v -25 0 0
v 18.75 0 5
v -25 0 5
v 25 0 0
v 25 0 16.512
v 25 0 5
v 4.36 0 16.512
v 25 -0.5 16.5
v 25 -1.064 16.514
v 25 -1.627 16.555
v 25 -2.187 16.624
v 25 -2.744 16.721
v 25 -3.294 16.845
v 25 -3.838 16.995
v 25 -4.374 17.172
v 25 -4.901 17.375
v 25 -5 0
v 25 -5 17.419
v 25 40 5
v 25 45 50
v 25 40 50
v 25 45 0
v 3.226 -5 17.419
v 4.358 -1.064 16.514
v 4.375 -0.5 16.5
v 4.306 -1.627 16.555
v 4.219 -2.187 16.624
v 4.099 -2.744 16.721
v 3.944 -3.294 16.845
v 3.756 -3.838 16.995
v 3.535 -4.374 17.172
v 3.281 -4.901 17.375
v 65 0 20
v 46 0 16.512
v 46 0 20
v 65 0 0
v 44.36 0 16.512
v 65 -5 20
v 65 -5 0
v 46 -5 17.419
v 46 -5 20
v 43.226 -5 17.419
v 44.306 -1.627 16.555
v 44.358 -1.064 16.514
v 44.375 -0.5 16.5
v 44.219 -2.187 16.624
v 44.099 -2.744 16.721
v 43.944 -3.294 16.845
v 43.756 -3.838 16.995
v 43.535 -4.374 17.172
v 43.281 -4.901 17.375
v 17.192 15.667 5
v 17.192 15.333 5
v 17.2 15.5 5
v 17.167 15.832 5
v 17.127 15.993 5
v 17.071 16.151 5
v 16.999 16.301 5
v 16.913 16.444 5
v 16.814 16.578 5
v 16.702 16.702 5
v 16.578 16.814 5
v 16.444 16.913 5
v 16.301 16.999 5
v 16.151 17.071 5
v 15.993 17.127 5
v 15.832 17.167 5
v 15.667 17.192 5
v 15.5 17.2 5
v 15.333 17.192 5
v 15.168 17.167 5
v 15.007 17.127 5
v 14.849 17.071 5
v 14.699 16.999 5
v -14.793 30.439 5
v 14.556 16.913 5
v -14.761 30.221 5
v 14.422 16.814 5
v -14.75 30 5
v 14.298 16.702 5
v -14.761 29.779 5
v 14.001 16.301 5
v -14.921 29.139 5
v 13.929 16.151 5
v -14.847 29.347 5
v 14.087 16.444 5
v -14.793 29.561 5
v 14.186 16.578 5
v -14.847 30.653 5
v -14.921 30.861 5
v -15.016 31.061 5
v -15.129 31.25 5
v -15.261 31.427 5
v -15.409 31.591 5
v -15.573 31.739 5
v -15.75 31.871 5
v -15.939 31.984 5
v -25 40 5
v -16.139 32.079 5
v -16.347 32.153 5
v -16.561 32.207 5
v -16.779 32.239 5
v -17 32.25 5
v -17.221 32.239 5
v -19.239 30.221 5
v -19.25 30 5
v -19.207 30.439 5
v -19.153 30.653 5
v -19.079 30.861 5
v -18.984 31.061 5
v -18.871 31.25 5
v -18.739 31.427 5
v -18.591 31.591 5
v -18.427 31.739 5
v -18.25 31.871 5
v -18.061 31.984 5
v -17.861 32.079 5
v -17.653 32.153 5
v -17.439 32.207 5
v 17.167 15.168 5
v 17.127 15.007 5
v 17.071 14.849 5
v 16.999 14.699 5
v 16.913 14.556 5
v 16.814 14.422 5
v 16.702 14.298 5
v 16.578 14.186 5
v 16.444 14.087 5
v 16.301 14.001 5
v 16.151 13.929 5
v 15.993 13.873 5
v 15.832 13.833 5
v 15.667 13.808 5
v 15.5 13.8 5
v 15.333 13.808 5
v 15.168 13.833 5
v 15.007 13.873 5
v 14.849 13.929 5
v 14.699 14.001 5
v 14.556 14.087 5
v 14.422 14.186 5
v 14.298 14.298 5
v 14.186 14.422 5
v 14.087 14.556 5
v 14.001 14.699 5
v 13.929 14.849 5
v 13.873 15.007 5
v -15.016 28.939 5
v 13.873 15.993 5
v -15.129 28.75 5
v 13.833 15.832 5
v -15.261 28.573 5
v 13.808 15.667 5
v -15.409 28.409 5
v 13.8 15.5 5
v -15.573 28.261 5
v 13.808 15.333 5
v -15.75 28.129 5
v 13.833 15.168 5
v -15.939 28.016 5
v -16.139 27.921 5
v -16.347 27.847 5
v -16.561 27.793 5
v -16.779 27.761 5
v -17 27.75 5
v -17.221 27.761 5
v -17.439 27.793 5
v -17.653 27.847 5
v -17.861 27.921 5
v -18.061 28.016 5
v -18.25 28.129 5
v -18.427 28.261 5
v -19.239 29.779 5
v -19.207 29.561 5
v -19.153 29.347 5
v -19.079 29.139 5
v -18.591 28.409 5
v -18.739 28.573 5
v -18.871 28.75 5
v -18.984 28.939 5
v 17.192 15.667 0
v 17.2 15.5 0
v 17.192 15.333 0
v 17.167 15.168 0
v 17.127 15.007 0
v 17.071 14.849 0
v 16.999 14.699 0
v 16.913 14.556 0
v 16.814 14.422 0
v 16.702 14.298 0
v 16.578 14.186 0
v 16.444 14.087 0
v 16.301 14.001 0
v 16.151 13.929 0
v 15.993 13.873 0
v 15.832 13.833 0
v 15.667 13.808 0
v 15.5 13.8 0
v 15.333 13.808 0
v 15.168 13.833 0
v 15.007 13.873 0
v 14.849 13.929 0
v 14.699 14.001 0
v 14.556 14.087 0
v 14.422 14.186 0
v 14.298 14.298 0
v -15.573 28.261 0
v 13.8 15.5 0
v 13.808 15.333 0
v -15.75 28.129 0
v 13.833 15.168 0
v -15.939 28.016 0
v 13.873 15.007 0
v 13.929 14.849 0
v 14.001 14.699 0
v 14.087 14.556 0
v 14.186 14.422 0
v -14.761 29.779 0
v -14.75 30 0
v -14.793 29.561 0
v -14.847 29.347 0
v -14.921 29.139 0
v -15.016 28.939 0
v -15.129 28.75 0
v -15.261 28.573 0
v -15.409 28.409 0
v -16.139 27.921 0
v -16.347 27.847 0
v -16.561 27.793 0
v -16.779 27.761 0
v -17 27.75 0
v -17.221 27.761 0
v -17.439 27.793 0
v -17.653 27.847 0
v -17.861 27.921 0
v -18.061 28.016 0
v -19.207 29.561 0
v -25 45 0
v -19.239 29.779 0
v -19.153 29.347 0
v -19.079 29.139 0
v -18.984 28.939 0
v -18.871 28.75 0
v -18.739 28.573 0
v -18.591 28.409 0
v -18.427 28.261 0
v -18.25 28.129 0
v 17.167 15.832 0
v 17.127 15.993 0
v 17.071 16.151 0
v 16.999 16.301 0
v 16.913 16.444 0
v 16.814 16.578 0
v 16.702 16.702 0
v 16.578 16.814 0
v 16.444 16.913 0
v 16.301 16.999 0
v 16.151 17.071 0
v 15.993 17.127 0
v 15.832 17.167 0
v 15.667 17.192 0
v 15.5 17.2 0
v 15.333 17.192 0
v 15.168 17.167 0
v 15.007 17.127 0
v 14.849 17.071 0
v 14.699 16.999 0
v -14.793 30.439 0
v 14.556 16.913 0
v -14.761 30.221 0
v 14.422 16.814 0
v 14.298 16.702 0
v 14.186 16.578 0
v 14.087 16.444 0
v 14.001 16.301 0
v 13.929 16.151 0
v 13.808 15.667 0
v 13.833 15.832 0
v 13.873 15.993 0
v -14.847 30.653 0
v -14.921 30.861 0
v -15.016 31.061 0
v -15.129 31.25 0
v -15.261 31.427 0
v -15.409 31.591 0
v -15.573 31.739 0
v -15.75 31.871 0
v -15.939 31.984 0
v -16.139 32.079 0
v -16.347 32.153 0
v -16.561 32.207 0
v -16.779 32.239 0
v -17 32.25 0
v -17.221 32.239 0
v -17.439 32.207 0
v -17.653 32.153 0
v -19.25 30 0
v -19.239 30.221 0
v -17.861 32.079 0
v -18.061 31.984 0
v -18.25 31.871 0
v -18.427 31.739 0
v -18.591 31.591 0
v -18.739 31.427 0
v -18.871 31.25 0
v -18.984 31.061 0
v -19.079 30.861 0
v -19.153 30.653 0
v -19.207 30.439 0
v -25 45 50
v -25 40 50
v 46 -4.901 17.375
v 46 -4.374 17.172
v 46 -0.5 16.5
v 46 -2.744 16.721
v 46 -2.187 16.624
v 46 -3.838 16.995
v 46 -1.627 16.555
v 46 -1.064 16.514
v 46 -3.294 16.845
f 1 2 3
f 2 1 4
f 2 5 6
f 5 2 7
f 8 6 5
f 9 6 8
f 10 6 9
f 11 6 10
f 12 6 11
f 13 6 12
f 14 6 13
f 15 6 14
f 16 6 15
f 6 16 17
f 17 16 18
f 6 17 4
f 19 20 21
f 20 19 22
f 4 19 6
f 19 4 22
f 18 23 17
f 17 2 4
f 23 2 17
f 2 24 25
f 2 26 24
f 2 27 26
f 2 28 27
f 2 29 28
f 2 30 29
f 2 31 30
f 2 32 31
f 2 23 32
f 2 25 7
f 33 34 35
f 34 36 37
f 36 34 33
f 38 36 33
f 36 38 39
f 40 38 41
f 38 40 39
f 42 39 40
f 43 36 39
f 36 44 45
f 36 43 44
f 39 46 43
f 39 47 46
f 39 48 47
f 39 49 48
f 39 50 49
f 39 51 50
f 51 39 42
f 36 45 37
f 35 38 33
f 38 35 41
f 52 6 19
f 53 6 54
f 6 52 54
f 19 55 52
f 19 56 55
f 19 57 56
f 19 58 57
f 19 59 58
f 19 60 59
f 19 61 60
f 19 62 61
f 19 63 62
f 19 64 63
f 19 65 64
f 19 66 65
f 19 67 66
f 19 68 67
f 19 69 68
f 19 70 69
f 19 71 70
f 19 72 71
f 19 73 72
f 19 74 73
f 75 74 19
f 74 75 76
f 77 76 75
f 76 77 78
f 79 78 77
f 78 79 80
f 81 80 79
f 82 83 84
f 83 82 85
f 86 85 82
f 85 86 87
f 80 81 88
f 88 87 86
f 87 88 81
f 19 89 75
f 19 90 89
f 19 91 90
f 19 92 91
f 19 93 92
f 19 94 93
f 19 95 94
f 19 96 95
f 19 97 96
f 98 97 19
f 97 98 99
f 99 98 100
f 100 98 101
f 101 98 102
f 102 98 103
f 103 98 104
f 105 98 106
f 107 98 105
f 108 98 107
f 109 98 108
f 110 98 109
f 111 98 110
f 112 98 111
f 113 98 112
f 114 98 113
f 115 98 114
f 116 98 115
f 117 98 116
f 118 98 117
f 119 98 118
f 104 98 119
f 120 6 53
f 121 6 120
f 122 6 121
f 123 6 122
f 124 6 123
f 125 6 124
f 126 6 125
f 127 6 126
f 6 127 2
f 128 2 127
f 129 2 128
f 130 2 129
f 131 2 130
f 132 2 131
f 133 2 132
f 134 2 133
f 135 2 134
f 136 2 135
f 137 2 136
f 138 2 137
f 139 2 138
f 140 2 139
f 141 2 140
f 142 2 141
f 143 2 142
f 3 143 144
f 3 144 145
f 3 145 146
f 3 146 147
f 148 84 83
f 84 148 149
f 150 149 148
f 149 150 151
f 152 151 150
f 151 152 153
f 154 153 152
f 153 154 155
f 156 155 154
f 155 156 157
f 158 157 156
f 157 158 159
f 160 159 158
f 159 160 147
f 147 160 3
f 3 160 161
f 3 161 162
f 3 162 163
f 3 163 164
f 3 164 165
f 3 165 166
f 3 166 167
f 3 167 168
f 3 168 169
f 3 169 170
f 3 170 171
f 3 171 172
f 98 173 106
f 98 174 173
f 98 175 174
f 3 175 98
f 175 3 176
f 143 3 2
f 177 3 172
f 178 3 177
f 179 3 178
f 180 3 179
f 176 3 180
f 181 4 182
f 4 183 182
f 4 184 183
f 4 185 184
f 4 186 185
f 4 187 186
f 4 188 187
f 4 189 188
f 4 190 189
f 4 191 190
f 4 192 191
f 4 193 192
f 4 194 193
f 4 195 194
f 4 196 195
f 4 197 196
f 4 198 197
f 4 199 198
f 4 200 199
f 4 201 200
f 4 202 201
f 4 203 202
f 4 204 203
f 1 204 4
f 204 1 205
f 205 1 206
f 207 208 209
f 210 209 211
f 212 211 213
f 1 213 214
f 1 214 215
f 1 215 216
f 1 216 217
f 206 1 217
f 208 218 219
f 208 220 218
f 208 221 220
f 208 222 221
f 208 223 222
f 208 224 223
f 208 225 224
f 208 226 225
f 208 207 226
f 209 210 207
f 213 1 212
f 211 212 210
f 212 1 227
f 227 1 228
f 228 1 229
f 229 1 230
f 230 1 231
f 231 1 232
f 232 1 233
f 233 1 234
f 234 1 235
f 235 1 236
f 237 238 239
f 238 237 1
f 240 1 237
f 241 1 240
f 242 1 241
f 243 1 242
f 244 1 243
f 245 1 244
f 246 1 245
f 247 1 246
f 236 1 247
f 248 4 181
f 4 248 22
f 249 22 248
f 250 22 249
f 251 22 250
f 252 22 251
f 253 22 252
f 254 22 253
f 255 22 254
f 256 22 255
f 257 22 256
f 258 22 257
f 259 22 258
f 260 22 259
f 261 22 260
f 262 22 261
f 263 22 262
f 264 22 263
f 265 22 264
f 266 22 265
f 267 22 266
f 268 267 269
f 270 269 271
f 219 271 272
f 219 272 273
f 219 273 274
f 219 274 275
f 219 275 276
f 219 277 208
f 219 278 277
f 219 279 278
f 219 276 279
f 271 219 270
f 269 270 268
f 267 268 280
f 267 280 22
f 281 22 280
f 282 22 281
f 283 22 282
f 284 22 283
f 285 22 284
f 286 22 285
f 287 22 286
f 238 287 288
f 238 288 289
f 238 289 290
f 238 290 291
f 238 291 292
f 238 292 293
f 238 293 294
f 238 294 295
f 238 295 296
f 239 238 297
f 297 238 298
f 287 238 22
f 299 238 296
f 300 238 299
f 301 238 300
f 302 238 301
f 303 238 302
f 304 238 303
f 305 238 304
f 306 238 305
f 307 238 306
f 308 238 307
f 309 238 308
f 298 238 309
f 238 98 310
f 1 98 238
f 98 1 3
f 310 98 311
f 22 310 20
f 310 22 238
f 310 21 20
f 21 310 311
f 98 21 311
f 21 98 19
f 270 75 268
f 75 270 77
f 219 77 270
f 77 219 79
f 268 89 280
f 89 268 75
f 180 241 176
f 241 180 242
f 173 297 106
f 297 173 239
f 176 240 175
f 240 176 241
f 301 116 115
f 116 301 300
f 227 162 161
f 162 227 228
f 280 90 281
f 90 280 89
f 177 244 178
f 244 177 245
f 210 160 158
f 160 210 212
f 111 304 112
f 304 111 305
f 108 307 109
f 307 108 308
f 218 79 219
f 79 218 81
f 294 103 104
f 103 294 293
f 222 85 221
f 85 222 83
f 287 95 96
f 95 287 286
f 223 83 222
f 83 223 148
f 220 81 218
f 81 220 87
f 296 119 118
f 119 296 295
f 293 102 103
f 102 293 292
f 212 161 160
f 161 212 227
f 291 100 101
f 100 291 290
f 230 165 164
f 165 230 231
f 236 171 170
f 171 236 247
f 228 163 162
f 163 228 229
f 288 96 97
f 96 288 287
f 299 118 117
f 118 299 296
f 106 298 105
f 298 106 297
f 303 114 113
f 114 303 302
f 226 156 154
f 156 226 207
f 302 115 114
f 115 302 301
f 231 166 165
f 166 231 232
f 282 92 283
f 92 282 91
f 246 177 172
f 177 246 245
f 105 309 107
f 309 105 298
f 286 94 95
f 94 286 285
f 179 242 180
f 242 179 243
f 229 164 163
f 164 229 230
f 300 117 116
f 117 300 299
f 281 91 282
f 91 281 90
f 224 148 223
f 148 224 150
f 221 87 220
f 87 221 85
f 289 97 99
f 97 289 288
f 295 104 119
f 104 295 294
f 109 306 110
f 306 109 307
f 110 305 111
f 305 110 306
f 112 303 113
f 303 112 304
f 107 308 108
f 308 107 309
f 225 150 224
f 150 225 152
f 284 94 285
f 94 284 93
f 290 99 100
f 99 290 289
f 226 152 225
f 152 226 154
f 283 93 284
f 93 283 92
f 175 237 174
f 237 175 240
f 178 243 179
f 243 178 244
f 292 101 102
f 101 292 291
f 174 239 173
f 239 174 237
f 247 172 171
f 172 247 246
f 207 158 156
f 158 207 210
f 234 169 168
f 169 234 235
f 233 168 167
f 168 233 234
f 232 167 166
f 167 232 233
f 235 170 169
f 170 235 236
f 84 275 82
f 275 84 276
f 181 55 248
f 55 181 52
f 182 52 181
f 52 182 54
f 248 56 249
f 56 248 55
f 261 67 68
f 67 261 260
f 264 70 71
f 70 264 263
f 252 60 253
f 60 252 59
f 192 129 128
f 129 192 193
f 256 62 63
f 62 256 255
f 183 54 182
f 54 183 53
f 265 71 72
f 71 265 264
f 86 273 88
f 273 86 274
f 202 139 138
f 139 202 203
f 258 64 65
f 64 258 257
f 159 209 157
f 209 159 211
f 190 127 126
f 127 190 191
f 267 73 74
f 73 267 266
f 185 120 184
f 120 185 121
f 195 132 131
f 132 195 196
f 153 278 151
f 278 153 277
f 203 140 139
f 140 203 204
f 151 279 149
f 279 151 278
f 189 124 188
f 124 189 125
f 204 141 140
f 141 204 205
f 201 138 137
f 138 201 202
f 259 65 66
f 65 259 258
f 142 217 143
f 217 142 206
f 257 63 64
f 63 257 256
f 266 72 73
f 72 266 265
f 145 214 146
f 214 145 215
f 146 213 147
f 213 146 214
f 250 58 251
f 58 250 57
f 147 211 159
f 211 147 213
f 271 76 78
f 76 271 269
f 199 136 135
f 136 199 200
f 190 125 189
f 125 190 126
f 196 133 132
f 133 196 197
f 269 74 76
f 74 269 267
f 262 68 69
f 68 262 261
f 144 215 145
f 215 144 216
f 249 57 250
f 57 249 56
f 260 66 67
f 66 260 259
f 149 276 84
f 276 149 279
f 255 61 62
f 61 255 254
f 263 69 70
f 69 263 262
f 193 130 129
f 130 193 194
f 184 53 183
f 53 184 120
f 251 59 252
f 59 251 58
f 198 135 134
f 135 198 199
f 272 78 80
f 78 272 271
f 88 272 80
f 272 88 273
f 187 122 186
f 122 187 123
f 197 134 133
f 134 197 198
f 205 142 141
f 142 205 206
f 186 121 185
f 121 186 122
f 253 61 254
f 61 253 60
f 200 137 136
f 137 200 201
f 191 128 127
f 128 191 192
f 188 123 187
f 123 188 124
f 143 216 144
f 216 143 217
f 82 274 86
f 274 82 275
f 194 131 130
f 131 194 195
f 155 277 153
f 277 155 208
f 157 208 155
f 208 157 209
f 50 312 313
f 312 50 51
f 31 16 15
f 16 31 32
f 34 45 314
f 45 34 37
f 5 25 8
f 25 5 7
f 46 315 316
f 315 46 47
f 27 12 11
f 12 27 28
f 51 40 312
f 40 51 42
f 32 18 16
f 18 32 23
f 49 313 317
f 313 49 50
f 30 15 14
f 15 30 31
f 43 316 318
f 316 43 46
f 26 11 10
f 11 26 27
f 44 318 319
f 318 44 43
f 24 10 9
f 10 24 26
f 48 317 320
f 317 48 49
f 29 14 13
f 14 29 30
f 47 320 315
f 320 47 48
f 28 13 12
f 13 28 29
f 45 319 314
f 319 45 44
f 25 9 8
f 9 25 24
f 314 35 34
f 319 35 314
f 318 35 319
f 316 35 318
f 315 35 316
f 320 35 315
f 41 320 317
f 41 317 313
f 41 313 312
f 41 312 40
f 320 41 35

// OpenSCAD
// L-shaped mounting bracket for a NEMA 17 stepper motor (e.g. syringe pump)
// Print orientation: base plate on the bed, vertical plate building up in +Z

// ---------------- Parameters ----------------
plate_x      = 25;    // base plate half-length (X)
plate_y      = 45;    // base plate length (Y)
plate_t      = 5;     // base plate thickness (Z)

motor_h      = 50;    // vertical motor plate height (Z)
motor_w      = 5;     // vertical plate thickness (Y)

boss_d       = 23;    // motor centring boss hole diameter
boss_x       = 0;     // boss hole centre X
boss_z       = 28;    // boss hole centre Z

screw_d      = 3.4;   // M3 screw hole diameter
screw_p      = 31;    // square pattern side length
screw_n      = 4;     // number of screw holes

gusset_t     = 5;     // gusset thickness (X)
gusset_y     = 20;    // gusset leg along +Y
gusset_z     = 20;    // gusset leg along +Z

eps          = 0.5;   // cutter overshoot past faces
$fn          = 96;    // curve resolution

// ---------------- Model ----------------
difference() {
    union() {
        // Base plate
        translate([-plate_x, 0, 0])
            cube([plate_x * 2, plate_y, plate_t]);

        // Vertical motor plate
        translate([-plate_x, plate_y - motor_w, 0])
            cube([plate_x * 2, motor_w, motor_h]);

        // Gussets: right triangle in YZ, flush with left/right edges
        for (sx = [-1, 1])
            translate([sx * (plate_x - gusset_t), 0, 0])
                rotate([90, 0, 0])
                    linear_extrude(height = gusset_t)
                        polygon([[gusset_y, gusset_z], [plate_y, gusset_z], [plate_y, 0]]);
    }

    // Base plate through-holes (M4)
    for (h = [plate_t + eps, motor_h + eps])
        translate([-17, 30, -eps])
            cylinder(d = 4.5, h = h, $fn = 64);

    // Boss hole along Y, centred on x = 0, z = 28
    translate([boss_x, -eps, boss_z])
        rotate([0, 90, 0])
            cylinder(d = boss_d, h = plate_y + 2 * eps, $fn = 128);

    // M3 screw holes on a square pattern centred on the boss hole
    for (i = [0 : screw_n - 1])
        translate([(i - (screw_n - 1) / 2) * screw_p,
                   (i - (screw_n - 1) / 2) * screw_p,
                   -eps])
            cylinder(d = screw_d, h = motor_h + 2 * eps, $fn = 64);
}
